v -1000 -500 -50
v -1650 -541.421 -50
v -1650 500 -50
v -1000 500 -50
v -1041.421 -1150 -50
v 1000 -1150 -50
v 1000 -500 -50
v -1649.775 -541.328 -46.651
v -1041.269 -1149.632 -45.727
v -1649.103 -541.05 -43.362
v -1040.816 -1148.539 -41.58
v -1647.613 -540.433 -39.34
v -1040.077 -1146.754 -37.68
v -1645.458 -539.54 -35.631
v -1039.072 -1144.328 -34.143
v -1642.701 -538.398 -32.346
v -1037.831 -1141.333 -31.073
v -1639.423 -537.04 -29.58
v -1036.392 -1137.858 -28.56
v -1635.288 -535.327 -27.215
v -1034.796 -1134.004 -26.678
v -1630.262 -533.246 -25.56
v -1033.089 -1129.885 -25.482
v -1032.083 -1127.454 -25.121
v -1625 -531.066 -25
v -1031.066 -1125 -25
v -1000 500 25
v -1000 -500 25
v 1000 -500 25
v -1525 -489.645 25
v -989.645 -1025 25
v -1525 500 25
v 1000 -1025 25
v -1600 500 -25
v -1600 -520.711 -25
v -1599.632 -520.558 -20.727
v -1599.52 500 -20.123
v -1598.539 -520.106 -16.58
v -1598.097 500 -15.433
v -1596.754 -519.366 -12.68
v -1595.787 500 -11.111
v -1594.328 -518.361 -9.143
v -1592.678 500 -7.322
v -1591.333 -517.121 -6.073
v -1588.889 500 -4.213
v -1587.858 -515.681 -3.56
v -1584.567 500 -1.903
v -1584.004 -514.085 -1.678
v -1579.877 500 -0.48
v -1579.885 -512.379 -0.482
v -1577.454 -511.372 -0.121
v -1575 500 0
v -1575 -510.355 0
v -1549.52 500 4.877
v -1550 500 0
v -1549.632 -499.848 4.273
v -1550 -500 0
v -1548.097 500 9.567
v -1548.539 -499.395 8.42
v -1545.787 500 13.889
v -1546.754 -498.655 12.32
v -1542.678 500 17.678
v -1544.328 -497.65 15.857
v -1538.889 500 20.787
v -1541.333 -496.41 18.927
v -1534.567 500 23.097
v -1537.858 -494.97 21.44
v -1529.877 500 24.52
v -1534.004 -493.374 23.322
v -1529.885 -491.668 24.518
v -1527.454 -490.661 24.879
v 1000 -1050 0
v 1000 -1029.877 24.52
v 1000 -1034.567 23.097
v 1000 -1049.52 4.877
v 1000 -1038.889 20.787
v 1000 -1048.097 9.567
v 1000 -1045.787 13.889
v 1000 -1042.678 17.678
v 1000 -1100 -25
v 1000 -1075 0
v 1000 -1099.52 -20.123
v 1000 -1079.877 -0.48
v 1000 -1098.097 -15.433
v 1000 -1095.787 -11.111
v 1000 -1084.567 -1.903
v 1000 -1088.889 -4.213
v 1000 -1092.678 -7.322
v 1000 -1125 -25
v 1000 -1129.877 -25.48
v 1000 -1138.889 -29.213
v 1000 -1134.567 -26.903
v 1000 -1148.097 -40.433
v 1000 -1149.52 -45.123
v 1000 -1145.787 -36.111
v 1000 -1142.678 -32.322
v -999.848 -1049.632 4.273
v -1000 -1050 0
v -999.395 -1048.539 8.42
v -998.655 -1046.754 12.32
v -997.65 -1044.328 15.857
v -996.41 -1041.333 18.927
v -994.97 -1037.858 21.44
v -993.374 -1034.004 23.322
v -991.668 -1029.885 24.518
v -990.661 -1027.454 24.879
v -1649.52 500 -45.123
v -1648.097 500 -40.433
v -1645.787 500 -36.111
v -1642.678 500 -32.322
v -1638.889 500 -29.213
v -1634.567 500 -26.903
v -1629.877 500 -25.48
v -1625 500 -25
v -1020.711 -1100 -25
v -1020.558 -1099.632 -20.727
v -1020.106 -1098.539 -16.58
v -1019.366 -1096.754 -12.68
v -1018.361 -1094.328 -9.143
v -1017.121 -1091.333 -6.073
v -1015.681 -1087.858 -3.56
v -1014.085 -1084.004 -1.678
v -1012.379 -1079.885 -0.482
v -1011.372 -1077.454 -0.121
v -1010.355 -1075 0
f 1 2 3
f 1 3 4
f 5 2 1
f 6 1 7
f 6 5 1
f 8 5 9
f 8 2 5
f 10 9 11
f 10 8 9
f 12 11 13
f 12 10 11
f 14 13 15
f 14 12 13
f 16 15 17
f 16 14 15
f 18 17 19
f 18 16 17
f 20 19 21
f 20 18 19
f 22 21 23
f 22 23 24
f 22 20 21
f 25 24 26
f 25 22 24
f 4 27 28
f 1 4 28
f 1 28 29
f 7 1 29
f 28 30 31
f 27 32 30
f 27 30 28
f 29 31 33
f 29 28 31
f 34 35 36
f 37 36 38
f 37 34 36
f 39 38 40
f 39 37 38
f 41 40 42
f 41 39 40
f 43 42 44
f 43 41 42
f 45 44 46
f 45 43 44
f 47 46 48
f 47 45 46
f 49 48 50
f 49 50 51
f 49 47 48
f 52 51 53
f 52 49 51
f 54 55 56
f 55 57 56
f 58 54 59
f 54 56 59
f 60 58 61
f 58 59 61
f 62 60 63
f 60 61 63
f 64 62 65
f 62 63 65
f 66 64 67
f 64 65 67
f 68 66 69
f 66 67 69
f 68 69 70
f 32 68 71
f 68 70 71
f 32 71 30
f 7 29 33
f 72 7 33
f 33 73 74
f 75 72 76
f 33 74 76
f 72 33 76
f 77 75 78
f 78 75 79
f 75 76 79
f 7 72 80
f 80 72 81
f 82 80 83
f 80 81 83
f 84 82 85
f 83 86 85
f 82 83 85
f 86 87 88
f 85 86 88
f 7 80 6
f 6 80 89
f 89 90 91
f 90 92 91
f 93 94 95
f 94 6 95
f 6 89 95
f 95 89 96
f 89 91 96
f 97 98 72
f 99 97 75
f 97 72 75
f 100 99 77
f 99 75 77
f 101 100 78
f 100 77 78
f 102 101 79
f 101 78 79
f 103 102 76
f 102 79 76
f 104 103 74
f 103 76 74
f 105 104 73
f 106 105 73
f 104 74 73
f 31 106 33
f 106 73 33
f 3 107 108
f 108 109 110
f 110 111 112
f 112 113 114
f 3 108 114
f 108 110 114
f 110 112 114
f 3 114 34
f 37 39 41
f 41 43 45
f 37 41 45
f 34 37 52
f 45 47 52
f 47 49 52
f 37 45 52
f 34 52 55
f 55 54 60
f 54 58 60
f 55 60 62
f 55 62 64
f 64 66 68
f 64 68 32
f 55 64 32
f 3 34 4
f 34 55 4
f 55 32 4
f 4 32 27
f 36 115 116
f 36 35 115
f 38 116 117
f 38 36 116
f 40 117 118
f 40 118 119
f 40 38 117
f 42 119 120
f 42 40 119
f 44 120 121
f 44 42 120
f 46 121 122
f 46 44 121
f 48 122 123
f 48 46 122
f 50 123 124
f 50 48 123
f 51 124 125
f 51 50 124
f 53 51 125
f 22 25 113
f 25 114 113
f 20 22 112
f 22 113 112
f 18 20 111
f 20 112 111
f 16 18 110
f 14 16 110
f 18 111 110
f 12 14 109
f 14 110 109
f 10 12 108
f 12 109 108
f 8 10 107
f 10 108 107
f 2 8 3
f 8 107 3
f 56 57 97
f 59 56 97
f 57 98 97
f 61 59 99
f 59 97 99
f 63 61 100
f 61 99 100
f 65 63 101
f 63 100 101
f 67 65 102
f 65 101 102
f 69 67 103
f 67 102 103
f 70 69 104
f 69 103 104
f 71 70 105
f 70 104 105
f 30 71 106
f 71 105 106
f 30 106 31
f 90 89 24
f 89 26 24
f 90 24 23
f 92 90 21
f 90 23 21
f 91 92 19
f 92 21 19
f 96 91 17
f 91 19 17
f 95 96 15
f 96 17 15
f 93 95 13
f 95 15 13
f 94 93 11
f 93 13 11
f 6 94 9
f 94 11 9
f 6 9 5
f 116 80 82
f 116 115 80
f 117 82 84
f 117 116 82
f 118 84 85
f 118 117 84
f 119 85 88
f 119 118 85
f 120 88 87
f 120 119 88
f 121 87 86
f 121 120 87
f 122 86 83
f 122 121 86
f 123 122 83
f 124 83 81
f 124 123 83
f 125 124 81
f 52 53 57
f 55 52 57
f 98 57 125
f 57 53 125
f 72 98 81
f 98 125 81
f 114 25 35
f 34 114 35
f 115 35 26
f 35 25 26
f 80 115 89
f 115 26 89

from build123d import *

# Parameters (mm, degrees)
F1_DEPTH = 25
F3_DEPTH = 25
F5_DEPTH = 25
F7_DEPTH = 720
F8_R     = 24.99999


# Not quite as in the source:
# - a fillet or chamfer is up to 0.001 mm smaller than in the source, because OpenCascade refuses the exact size


with BuildPart() as f1:
    # F0 (on Top) → F1 (new body)
    with BuildSketch(Plane.XY):
        Polygon((-1000, -500), (-1000, 500), (-1550, 500), (-1550, -500), (-1000, -1050), (1000, -1050), (1000, -500), align=None)
    extrude(amount=F1_DEPTH)

    # F2 (on face) → F3 (join)
    with BuildSketch(Plane(origin=(0, 0, 0), x_dir=(1, 0, 0), z_dir=(0, 0, -1))):
        Polygon((-1020.7106781187, 1100), (-1600, 520.7106781187), (-1600, -550), (-950, -550), (-950, 450), (1050, 450), (1050, 1100), align=None)
    extrude(amount=F3_DEPTH)

    # F4 (on face) → F5 (join)
    with BuildSketch(Plane(origin=(0, 0, -25), x_dir=(1, 0, 0), z_dir=(0, 0, -1))):
        Polygon((-1041.4213562373, 1150), (-1650, 541.4213562373), (-1650, -600), (-900, -600), (-900, 400), (1100, 400), (1100, 1150), align=None)
    extrude(amount=F5_DEPTH)

    # F6 (on face) → F7 (cut)
    with BuildSketch(Plane.XY.offset(25)):
        Polygon((-1950.9481191635, 705.582857132), (-1946.2337493896, 500), (-1000, 500), (-1000, -500), (1000, -500), (1000, -1340.4409885406), (1594.2358970642, -1340.4409885406), (1594.2358970642, 705.582857132), align=None)
    extrude(amount=-F7_DEPTH, mode=Mode.SUBTRACT)

    # F8 (radius 25 in the source; OpenCascade refuses exactly that, so slightly less here)
    f8_edges = [f1.edges().sort_by_distance(p)[0] for p in [
        (-1550, 0, 25),
        (-1600, -10.355339, 0),
        (-1650, -20.710678, -25),
        (-1275, -775, 25),
        (-1310.355339, -810.355339, 0),
        (-1345.710678, -845.710678, -25),
        (0, -1050, 25),
        (-10.355339, -1100, 0),
        (-20.710678, -1150, -25),
    ]]
    fillet(f8_edges, radius=F8_R)


solid = f1.part
